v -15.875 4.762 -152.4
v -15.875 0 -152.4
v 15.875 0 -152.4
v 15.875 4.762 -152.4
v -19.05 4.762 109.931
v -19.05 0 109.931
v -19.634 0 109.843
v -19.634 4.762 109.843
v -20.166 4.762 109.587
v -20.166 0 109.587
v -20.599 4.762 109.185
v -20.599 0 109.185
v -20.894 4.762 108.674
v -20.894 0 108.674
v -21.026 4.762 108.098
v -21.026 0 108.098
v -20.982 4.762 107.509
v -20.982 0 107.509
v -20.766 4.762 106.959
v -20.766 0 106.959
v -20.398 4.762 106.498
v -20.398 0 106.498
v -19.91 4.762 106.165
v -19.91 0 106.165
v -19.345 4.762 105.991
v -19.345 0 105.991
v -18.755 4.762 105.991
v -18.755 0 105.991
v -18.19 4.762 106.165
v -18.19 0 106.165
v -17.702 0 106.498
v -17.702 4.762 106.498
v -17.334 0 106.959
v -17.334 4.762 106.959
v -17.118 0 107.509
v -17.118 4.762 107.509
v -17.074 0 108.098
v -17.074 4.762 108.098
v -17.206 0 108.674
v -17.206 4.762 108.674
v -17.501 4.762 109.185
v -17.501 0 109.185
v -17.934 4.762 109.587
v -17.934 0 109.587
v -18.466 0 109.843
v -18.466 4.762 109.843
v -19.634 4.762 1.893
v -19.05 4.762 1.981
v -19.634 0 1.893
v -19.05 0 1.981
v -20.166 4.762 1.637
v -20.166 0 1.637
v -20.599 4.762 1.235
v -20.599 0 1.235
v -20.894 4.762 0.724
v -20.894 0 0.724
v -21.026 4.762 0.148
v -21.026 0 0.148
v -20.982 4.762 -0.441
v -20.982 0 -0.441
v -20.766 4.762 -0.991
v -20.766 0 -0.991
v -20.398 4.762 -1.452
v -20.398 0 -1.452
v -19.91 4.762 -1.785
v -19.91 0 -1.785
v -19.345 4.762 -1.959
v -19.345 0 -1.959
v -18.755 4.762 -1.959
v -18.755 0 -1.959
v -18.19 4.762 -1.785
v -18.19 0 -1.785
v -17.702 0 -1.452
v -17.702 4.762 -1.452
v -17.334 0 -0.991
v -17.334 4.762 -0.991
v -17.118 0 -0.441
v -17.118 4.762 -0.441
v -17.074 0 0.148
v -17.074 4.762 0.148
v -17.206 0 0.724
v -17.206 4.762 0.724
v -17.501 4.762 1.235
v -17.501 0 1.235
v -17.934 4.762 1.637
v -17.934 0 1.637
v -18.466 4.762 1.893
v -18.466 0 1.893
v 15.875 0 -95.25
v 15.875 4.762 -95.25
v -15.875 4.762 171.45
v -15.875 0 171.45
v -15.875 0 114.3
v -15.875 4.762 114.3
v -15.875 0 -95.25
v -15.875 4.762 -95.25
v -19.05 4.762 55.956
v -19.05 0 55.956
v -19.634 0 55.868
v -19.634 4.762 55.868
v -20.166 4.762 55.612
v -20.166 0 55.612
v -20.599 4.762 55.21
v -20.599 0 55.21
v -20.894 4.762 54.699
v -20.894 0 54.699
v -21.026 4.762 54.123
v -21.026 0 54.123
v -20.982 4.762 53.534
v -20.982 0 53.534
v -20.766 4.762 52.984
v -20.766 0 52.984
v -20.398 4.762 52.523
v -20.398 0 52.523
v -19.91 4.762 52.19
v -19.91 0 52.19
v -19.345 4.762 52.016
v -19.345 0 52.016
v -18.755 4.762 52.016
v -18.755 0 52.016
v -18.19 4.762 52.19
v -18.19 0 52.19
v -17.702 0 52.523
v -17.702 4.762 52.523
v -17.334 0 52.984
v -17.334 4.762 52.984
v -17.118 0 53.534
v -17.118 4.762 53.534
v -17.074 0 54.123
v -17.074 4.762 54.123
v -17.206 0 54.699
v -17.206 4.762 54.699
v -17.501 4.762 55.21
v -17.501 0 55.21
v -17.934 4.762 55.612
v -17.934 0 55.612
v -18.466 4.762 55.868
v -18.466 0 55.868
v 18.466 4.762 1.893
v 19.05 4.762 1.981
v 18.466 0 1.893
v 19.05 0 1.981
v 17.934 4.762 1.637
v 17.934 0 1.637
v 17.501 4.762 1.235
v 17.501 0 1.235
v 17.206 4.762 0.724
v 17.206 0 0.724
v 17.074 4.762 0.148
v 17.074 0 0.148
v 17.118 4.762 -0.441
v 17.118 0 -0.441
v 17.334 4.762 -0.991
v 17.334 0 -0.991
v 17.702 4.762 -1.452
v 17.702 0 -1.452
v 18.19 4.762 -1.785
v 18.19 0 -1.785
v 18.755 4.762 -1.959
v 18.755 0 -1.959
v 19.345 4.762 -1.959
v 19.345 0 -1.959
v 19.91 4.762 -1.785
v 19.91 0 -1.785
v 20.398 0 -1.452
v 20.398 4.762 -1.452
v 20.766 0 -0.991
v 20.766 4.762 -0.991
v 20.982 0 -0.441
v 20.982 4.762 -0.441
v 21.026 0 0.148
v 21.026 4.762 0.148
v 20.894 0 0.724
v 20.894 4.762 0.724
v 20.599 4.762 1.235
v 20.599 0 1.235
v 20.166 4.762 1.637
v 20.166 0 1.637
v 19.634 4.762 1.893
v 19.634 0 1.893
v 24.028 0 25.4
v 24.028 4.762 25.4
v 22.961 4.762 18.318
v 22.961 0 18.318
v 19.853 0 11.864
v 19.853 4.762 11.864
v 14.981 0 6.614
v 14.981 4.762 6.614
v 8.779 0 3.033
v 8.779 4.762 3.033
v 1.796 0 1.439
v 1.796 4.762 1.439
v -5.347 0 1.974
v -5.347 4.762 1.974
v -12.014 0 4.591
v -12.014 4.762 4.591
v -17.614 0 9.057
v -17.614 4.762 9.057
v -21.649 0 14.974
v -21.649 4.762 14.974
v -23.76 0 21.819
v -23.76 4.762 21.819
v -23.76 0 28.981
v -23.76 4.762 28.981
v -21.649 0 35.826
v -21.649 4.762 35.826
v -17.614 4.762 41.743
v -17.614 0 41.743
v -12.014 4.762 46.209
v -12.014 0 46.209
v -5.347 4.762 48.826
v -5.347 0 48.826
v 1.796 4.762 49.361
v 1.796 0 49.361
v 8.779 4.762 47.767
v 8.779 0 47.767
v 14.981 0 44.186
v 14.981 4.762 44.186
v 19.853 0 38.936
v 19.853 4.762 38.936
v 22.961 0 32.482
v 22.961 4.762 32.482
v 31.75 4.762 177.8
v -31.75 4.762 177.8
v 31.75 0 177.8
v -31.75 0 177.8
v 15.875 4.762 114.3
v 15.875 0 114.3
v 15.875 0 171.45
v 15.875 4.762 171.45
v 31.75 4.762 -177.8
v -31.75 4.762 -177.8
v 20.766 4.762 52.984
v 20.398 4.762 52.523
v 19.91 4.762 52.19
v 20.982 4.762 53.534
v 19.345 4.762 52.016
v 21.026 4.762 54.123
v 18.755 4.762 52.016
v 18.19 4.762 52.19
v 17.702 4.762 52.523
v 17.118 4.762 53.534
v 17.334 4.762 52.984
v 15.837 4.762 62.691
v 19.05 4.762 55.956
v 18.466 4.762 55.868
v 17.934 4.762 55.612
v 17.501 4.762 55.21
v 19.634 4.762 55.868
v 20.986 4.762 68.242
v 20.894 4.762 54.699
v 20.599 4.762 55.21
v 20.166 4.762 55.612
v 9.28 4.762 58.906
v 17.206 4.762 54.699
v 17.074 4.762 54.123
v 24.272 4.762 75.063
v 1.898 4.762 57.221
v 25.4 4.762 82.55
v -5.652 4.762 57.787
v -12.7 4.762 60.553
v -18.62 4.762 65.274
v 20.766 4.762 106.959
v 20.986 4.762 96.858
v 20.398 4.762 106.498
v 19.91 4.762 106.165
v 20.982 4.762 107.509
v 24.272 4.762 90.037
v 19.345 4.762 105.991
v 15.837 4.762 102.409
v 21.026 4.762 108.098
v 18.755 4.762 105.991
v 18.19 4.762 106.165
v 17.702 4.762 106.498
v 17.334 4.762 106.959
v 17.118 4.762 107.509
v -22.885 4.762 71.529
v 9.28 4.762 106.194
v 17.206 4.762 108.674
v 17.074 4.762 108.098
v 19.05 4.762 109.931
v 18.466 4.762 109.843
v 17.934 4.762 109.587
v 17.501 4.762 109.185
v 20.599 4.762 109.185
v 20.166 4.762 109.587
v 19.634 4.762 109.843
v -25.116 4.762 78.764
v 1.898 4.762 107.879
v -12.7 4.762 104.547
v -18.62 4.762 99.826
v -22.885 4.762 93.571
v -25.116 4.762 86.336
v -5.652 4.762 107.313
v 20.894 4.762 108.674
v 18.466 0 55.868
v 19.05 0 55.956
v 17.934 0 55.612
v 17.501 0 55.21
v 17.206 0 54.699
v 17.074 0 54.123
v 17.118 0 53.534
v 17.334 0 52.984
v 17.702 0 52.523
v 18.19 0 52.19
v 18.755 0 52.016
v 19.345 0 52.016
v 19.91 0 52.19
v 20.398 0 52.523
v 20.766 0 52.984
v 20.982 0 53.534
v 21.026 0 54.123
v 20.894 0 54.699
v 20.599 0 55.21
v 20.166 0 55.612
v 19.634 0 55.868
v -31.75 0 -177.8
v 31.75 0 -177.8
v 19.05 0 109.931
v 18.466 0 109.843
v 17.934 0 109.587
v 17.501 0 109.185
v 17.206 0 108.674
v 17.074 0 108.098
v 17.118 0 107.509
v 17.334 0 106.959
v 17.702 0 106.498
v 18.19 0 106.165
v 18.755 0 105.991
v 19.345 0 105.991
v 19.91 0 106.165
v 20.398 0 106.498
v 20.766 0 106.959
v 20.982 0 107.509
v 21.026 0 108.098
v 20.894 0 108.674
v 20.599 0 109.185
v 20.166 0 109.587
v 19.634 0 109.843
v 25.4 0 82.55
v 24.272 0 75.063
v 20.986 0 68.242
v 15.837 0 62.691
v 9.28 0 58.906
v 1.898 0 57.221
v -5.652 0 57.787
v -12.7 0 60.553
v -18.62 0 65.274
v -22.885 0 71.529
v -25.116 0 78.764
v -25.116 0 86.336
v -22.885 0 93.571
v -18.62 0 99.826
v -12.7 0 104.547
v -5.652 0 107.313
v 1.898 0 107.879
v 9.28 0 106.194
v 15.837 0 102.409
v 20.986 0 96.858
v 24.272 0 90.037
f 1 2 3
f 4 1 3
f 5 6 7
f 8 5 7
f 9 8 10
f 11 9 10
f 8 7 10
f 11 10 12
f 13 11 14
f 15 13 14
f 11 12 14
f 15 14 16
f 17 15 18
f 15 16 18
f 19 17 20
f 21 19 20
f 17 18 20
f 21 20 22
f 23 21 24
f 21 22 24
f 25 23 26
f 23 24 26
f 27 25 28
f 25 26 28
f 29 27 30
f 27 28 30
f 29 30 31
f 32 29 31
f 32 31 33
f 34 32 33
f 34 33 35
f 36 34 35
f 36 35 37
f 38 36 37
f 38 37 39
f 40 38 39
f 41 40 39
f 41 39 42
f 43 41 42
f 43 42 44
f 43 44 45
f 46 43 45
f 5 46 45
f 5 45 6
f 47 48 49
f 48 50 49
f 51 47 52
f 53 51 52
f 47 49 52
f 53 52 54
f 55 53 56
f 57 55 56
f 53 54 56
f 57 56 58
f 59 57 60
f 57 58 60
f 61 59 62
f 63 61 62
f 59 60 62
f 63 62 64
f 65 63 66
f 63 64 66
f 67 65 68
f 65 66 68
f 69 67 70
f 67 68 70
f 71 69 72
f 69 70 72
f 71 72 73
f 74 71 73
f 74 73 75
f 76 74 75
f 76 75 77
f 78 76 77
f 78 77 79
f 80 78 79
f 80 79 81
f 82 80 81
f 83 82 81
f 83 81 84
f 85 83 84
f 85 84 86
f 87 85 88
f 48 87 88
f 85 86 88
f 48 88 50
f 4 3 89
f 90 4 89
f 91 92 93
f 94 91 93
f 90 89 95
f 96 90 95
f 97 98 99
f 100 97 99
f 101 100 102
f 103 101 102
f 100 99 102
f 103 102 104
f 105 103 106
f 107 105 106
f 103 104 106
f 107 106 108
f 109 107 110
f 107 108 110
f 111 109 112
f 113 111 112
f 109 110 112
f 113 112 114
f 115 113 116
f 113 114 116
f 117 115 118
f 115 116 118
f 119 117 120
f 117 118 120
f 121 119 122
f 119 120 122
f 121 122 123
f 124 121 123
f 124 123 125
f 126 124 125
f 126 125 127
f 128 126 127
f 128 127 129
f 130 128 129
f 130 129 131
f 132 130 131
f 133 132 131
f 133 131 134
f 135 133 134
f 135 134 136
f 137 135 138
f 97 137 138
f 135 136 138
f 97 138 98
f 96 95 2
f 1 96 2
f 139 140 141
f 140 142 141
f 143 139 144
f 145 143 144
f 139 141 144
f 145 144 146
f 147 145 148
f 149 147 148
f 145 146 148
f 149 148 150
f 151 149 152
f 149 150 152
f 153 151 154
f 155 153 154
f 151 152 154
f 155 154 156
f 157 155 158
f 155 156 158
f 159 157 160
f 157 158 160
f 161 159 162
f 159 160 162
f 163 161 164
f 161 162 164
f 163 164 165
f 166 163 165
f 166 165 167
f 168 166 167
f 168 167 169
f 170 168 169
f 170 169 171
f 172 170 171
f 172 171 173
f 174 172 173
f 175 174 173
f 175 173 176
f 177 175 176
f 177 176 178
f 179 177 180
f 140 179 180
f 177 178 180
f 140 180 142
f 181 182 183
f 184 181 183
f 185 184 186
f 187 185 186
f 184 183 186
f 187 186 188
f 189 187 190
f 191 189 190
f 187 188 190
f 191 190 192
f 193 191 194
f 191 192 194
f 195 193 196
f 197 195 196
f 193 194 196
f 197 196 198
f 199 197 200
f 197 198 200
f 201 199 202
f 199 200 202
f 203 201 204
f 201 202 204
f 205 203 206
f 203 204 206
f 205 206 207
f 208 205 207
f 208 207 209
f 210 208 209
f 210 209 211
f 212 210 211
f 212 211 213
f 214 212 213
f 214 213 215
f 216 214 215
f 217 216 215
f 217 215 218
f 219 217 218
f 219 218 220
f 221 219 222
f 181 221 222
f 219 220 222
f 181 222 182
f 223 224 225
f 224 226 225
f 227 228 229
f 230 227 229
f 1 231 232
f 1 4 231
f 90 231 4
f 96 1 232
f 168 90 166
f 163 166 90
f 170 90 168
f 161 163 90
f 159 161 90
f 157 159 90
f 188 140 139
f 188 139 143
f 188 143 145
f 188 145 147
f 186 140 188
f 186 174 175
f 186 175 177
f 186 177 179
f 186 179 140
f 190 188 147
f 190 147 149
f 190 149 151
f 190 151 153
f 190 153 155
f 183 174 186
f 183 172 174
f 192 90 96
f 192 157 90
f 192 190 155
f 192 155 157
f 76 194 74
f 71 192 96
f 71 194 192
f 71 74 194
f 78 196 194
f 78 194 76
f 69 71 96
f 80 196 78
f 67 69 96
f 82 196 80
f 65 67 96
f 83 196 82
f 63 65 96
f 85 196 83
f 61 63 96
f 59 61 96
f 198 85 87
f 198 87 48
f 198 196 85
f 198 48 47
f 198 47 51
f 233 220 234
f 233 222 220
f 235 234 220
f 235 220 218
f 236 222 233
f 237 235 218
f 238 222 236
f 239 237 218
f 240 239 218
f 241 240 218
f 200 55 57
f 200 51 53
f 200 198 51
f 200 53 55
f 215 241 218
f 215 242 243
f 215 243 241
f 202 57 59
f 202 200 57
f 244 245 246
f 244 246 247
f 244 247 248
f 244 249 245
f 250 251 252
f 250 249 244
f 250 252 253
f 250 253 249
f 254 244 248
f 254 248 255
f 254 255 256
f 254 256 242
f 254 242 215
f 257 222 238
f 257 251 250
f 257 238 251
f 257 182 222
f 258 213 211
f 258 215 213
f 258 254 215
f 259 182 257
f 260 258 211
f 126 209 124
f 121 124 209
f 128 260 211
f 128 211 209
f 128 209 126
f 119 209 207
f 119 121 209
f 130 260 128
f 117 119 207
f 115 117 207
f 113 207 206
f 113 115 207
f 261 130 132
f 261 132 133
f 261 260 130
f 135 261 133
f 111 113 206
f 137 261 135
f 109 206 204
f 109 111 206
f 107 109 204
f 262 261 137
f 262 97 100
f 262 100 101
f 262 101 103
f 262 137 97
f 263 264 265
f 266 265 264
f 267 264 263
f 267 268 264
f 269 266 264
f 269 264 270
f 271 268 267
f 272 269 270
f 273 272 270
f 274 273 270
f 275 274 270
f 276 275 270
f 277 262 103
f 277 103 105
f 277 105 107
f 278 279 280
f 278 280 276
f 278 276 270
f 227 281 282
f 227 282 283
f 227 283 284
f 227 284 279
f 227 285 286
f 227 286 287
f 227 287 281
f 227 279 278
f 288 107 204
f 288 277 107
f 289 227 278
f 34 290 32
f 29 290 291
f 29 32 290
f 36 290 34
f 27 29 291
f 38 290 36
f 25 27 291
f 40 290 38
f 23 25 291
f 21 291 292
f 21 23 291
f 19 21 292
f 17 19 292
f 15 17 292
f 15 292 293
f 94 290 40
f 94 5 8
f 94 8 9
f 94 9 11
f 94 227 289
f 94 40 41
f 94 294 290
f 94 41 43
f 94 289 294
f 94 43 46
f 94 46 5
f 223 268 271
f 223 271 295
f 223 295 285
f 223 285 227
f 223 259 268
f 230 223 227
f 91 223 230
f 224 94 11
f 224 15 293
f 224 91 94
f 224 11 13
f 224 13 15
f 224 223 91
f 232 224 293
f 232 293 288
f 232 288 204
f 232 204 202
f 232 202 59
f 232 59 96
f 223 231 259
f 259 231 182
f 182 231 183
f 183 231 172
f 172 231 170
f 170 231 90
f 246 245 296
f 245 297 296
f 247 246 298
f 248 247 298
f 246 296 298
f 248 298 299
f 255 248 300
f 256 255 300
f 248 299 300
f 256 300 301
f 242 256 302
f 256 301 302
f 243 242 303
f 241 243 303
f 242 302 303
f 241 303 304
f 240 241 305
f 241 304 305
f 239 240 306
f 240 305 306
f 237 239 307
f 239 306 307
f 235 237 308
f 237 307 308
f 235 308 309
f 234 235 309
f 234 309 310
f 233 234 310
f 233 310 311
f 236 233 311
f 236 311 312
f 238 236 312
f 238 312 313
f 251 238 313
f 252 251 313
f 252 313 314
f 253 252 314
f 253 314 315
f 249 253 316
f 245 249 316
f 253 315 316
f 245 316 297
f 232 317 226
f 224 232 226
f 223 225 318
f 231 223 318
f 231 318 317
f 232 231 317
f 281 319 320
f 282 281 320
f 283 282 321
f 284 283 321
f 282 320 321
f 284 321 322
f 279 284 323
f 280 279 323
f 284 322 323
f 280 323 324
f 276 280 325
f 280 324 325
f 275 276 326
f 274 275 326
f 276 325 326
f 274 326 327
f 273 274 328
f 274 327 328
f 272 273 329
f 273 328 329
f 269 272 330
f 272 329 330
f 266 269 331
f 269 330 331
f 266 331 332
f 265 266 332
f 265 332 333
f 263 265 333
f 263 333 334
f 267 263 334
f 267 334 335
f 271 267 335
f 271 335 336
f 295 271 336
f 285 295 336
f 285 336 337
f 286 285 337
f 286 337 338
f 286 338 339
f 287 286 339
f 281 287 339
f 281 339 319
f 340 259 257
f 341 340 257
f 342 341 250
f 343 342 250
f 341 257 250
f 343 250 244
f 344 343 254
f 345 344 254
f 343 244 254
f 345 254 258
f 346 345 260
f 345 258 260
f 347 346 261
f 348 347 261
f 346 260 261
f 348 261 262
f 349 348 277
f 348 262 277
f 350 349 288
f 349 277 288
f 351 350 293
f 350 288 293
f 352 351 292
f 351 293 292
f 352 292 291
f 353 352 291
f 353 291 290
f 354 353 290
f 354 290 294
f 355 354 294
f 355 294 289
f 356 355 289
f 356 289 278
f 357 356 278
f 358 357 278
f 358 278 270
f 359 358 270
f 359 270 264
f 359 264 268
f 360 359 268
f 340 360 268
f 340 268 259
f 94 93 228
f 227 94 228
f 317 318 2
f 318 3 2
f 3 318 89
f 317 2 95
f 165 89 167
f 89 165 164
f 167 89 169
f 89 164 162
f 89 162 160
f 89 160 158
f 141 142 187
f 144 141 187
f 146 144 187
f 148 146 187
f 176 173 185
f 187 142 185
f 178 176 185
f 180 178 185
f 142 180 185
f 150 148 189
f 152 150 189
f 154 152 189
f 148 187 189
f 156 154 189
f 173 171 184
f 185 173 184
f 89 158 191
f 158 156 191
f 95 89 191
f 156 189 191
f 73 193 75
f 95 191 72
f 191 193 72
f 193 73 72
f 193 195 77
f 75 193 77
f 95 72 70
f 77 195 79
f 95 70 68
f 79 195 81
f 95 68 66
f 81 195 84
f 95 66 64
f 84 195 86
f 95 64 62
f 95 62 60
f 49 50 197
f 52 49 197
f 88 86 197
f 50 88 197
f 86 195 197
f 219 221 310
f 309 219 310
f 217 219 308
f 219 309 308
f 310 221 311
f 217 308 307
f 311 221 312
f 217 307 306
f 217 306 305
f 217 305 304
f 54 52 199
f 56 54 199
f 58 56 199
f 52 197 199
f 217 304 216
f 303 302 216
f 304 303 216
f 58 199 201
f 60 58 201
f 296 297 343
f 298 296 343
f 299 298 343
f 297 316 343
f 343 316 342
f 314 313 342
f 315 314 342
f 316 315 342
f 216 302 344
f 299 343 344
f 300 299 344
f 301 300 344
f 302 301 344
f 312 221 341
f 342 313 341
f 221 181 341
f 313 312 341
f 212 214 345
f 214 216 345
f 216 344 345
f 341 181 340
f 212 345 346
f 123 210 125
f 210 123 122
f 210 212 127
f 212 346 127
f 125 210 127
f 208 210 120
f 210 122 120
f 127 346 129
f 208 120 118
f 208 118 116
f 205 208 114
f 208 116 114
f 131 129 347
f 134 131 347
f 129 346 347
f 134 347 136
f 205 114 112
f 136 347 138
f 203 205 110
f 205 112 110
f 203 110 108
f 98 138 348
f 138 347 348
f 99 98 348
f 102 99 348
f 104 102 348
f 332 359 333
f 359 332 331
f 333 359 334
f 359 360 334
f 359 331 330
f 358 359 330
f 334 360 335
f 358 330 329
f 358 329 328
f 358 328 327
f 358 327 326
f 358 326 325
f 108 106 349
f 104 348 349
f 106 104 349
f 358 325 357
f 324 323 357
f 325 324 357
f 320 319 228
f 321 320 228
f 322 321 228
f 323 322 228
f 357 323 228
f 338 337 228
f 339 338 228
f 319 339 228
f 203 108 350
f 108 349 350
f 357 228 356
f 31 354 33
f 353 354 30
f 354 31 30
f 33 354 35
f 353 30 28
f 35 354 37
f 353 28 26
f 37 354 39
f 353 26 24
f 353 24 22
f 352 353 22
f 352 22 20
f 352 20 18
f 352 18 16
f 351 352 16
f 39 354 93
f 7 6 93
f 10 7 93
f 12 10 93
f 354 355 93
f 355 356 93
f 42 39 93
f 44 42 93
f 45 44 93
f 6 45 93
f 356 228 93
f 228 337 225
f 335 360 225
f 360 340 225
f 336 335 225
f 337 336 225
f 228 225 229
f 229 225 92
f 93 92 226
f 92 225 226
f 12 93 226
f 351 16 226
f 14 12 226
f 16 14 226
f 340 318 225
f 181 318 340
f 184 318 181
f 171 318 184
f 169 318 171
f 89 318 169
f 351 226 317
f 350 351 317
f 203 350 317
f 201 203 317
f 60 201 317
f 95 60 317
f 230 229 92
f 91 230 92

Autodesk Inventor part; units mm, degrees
ref_plane "YZ Plane" through (0, 0, 0) normal (1, 0, 0) x (0, 1, 0)
ref_plane "XZ Plane" through (0, 0, 0) normal (0, 1, 0) x (-1, 0, 0)
ref_plane "XY Plane" through (0, 0, 0) normal (0, 0, 1) x (1, 0, 0)
sketch "Sketch1" plane through (0, 0, 0) normal (0, 1, 0) x (-1, 0, 0)
  line L0 (-31.75, -177.8) -> (31.75, -177.8)
  line L1 (31.75, -177.8) -> (31.75, 177.8)
  line L2 (31.75, 177.8) -> (-31.75, 177.8)
  line L3 (-31.75, 177.8) -> (-31.75, -177.8)
  line L4 (-31.75, -177.8) -> (31.75, 177.8) construction
  line L5 (31.75, -177.8) -> (-31.75, 177.8) construction
  line L6 (15.875, -152.4) -> (-15.875, -152.4)
  line L7 (-15.875, -152.4) -> (-15.875, -95.25)
  line L8 (-15.875, -95.25) -> (15.875, -95.25)
  line L9 (15.875, -95.25) -> (15.875, -152.4)
  line L10 (-15.875, 171.45) -> (15.875, 171.45)
  line L11 (15.875, 171.45) -> (15.875, 114.3)
  line L12 (15.875, 114.3) -> (-15.875, 114.3)
  line L13 (-15.875, 114.3) -> (-15.875, 171.45)
  point P0 (0, 0)
  point P1 (0, -95.25)
  point P2 (0, 114.3)
  dimension "d0" = 31.75
  dimension "d1" = 57.15
  dimension "d2" = 355.6
  dimension "d3" = 25.4
  dimension "d4" = 63.5
  dimension "d6" = 6.35
extrude "Plate1" add sketch "Sketch1" along normal blind 4.7625
sketch "Sketch2" plane through (0, 4.7625, 0) normal (0, 1, 0) x (1, 0, 0)
  circle A0 centre (0, -82.55) radius 25.4
  circle A1 centre (0, -25.4) radius 24.0284
  point P0 (0, 0)
  dimension "d7" = 50.8
  dimension "d8" = 82.55
  dimension "d9" = 48.0568
  dimension "d10" = 57.15
extrude "Cut1" cut sketch "Sketch2" against normal blind 4.7625
sketch "Sketch3" plane through (0, 4.7625, 0) normal (0, 1, 0) x (1, 0, 0)
  line L0 (31.75, 177.8) -> (31.75, -177.8) construction
  line L1 (31.75, -177.8) -> (-31.75, -177.8) construction
  circle A0 centre (0, -82.55) radius 25.4 projected
  point P0 (0, 0)
  point P1 (19.05, -107.95)
  point P2 (-19.05, -107.95)
  point P3 (19.05, -53.975)
  point P4 (-19.05, -53.975)
  point P5 (19.05, 0)
  point P6 (-19.05, 0)
  dimension "d13" = 12.7
  dimension "d16" = 38.1
  dimension "d19" = 53.975
  dimension "d22" = 28.575
hole "Hole1" at (19.05, 4.7625, 107.95) at (-19.05, 4.7625, 107.95) at (19.05, 4.7625, 53.975) at (-19.05, 4.7625, 53.975) at (19.05, 4.7625, 0) at (-19.05, 4.7625, 0) direction (0, -1, 0) diameter 3.9624 end through all thread size "10-32 UNF" class "2B" standard "ANSI Unified Screw Threads"
equation "\"d11\" = Thickness"
equation "\"d28\" = Thickness"
equation "\"d5\" = Thickness"
equation "\"BendRadius\" = Thickness"
equation "\"BendReliefWidth\" = Thickness"
equation "\"BendReliefDepth\" = 0.5 * Thickness"
equation "\"CornerReliefSize\" = 4 * Thickness"
equation "\"MinimumRemnant\" = 2 * Thickness"
equation "\"TransitionRadius\" = BendRadius"
equation "\"JacobiRadiusSize\" = BendRadius"
equation "\"GapSize\" = Thickness"
equation "\"Thickness\" = 4.7625"
properties part number "PLATE,FRONT" material "Aluminum 6061"
